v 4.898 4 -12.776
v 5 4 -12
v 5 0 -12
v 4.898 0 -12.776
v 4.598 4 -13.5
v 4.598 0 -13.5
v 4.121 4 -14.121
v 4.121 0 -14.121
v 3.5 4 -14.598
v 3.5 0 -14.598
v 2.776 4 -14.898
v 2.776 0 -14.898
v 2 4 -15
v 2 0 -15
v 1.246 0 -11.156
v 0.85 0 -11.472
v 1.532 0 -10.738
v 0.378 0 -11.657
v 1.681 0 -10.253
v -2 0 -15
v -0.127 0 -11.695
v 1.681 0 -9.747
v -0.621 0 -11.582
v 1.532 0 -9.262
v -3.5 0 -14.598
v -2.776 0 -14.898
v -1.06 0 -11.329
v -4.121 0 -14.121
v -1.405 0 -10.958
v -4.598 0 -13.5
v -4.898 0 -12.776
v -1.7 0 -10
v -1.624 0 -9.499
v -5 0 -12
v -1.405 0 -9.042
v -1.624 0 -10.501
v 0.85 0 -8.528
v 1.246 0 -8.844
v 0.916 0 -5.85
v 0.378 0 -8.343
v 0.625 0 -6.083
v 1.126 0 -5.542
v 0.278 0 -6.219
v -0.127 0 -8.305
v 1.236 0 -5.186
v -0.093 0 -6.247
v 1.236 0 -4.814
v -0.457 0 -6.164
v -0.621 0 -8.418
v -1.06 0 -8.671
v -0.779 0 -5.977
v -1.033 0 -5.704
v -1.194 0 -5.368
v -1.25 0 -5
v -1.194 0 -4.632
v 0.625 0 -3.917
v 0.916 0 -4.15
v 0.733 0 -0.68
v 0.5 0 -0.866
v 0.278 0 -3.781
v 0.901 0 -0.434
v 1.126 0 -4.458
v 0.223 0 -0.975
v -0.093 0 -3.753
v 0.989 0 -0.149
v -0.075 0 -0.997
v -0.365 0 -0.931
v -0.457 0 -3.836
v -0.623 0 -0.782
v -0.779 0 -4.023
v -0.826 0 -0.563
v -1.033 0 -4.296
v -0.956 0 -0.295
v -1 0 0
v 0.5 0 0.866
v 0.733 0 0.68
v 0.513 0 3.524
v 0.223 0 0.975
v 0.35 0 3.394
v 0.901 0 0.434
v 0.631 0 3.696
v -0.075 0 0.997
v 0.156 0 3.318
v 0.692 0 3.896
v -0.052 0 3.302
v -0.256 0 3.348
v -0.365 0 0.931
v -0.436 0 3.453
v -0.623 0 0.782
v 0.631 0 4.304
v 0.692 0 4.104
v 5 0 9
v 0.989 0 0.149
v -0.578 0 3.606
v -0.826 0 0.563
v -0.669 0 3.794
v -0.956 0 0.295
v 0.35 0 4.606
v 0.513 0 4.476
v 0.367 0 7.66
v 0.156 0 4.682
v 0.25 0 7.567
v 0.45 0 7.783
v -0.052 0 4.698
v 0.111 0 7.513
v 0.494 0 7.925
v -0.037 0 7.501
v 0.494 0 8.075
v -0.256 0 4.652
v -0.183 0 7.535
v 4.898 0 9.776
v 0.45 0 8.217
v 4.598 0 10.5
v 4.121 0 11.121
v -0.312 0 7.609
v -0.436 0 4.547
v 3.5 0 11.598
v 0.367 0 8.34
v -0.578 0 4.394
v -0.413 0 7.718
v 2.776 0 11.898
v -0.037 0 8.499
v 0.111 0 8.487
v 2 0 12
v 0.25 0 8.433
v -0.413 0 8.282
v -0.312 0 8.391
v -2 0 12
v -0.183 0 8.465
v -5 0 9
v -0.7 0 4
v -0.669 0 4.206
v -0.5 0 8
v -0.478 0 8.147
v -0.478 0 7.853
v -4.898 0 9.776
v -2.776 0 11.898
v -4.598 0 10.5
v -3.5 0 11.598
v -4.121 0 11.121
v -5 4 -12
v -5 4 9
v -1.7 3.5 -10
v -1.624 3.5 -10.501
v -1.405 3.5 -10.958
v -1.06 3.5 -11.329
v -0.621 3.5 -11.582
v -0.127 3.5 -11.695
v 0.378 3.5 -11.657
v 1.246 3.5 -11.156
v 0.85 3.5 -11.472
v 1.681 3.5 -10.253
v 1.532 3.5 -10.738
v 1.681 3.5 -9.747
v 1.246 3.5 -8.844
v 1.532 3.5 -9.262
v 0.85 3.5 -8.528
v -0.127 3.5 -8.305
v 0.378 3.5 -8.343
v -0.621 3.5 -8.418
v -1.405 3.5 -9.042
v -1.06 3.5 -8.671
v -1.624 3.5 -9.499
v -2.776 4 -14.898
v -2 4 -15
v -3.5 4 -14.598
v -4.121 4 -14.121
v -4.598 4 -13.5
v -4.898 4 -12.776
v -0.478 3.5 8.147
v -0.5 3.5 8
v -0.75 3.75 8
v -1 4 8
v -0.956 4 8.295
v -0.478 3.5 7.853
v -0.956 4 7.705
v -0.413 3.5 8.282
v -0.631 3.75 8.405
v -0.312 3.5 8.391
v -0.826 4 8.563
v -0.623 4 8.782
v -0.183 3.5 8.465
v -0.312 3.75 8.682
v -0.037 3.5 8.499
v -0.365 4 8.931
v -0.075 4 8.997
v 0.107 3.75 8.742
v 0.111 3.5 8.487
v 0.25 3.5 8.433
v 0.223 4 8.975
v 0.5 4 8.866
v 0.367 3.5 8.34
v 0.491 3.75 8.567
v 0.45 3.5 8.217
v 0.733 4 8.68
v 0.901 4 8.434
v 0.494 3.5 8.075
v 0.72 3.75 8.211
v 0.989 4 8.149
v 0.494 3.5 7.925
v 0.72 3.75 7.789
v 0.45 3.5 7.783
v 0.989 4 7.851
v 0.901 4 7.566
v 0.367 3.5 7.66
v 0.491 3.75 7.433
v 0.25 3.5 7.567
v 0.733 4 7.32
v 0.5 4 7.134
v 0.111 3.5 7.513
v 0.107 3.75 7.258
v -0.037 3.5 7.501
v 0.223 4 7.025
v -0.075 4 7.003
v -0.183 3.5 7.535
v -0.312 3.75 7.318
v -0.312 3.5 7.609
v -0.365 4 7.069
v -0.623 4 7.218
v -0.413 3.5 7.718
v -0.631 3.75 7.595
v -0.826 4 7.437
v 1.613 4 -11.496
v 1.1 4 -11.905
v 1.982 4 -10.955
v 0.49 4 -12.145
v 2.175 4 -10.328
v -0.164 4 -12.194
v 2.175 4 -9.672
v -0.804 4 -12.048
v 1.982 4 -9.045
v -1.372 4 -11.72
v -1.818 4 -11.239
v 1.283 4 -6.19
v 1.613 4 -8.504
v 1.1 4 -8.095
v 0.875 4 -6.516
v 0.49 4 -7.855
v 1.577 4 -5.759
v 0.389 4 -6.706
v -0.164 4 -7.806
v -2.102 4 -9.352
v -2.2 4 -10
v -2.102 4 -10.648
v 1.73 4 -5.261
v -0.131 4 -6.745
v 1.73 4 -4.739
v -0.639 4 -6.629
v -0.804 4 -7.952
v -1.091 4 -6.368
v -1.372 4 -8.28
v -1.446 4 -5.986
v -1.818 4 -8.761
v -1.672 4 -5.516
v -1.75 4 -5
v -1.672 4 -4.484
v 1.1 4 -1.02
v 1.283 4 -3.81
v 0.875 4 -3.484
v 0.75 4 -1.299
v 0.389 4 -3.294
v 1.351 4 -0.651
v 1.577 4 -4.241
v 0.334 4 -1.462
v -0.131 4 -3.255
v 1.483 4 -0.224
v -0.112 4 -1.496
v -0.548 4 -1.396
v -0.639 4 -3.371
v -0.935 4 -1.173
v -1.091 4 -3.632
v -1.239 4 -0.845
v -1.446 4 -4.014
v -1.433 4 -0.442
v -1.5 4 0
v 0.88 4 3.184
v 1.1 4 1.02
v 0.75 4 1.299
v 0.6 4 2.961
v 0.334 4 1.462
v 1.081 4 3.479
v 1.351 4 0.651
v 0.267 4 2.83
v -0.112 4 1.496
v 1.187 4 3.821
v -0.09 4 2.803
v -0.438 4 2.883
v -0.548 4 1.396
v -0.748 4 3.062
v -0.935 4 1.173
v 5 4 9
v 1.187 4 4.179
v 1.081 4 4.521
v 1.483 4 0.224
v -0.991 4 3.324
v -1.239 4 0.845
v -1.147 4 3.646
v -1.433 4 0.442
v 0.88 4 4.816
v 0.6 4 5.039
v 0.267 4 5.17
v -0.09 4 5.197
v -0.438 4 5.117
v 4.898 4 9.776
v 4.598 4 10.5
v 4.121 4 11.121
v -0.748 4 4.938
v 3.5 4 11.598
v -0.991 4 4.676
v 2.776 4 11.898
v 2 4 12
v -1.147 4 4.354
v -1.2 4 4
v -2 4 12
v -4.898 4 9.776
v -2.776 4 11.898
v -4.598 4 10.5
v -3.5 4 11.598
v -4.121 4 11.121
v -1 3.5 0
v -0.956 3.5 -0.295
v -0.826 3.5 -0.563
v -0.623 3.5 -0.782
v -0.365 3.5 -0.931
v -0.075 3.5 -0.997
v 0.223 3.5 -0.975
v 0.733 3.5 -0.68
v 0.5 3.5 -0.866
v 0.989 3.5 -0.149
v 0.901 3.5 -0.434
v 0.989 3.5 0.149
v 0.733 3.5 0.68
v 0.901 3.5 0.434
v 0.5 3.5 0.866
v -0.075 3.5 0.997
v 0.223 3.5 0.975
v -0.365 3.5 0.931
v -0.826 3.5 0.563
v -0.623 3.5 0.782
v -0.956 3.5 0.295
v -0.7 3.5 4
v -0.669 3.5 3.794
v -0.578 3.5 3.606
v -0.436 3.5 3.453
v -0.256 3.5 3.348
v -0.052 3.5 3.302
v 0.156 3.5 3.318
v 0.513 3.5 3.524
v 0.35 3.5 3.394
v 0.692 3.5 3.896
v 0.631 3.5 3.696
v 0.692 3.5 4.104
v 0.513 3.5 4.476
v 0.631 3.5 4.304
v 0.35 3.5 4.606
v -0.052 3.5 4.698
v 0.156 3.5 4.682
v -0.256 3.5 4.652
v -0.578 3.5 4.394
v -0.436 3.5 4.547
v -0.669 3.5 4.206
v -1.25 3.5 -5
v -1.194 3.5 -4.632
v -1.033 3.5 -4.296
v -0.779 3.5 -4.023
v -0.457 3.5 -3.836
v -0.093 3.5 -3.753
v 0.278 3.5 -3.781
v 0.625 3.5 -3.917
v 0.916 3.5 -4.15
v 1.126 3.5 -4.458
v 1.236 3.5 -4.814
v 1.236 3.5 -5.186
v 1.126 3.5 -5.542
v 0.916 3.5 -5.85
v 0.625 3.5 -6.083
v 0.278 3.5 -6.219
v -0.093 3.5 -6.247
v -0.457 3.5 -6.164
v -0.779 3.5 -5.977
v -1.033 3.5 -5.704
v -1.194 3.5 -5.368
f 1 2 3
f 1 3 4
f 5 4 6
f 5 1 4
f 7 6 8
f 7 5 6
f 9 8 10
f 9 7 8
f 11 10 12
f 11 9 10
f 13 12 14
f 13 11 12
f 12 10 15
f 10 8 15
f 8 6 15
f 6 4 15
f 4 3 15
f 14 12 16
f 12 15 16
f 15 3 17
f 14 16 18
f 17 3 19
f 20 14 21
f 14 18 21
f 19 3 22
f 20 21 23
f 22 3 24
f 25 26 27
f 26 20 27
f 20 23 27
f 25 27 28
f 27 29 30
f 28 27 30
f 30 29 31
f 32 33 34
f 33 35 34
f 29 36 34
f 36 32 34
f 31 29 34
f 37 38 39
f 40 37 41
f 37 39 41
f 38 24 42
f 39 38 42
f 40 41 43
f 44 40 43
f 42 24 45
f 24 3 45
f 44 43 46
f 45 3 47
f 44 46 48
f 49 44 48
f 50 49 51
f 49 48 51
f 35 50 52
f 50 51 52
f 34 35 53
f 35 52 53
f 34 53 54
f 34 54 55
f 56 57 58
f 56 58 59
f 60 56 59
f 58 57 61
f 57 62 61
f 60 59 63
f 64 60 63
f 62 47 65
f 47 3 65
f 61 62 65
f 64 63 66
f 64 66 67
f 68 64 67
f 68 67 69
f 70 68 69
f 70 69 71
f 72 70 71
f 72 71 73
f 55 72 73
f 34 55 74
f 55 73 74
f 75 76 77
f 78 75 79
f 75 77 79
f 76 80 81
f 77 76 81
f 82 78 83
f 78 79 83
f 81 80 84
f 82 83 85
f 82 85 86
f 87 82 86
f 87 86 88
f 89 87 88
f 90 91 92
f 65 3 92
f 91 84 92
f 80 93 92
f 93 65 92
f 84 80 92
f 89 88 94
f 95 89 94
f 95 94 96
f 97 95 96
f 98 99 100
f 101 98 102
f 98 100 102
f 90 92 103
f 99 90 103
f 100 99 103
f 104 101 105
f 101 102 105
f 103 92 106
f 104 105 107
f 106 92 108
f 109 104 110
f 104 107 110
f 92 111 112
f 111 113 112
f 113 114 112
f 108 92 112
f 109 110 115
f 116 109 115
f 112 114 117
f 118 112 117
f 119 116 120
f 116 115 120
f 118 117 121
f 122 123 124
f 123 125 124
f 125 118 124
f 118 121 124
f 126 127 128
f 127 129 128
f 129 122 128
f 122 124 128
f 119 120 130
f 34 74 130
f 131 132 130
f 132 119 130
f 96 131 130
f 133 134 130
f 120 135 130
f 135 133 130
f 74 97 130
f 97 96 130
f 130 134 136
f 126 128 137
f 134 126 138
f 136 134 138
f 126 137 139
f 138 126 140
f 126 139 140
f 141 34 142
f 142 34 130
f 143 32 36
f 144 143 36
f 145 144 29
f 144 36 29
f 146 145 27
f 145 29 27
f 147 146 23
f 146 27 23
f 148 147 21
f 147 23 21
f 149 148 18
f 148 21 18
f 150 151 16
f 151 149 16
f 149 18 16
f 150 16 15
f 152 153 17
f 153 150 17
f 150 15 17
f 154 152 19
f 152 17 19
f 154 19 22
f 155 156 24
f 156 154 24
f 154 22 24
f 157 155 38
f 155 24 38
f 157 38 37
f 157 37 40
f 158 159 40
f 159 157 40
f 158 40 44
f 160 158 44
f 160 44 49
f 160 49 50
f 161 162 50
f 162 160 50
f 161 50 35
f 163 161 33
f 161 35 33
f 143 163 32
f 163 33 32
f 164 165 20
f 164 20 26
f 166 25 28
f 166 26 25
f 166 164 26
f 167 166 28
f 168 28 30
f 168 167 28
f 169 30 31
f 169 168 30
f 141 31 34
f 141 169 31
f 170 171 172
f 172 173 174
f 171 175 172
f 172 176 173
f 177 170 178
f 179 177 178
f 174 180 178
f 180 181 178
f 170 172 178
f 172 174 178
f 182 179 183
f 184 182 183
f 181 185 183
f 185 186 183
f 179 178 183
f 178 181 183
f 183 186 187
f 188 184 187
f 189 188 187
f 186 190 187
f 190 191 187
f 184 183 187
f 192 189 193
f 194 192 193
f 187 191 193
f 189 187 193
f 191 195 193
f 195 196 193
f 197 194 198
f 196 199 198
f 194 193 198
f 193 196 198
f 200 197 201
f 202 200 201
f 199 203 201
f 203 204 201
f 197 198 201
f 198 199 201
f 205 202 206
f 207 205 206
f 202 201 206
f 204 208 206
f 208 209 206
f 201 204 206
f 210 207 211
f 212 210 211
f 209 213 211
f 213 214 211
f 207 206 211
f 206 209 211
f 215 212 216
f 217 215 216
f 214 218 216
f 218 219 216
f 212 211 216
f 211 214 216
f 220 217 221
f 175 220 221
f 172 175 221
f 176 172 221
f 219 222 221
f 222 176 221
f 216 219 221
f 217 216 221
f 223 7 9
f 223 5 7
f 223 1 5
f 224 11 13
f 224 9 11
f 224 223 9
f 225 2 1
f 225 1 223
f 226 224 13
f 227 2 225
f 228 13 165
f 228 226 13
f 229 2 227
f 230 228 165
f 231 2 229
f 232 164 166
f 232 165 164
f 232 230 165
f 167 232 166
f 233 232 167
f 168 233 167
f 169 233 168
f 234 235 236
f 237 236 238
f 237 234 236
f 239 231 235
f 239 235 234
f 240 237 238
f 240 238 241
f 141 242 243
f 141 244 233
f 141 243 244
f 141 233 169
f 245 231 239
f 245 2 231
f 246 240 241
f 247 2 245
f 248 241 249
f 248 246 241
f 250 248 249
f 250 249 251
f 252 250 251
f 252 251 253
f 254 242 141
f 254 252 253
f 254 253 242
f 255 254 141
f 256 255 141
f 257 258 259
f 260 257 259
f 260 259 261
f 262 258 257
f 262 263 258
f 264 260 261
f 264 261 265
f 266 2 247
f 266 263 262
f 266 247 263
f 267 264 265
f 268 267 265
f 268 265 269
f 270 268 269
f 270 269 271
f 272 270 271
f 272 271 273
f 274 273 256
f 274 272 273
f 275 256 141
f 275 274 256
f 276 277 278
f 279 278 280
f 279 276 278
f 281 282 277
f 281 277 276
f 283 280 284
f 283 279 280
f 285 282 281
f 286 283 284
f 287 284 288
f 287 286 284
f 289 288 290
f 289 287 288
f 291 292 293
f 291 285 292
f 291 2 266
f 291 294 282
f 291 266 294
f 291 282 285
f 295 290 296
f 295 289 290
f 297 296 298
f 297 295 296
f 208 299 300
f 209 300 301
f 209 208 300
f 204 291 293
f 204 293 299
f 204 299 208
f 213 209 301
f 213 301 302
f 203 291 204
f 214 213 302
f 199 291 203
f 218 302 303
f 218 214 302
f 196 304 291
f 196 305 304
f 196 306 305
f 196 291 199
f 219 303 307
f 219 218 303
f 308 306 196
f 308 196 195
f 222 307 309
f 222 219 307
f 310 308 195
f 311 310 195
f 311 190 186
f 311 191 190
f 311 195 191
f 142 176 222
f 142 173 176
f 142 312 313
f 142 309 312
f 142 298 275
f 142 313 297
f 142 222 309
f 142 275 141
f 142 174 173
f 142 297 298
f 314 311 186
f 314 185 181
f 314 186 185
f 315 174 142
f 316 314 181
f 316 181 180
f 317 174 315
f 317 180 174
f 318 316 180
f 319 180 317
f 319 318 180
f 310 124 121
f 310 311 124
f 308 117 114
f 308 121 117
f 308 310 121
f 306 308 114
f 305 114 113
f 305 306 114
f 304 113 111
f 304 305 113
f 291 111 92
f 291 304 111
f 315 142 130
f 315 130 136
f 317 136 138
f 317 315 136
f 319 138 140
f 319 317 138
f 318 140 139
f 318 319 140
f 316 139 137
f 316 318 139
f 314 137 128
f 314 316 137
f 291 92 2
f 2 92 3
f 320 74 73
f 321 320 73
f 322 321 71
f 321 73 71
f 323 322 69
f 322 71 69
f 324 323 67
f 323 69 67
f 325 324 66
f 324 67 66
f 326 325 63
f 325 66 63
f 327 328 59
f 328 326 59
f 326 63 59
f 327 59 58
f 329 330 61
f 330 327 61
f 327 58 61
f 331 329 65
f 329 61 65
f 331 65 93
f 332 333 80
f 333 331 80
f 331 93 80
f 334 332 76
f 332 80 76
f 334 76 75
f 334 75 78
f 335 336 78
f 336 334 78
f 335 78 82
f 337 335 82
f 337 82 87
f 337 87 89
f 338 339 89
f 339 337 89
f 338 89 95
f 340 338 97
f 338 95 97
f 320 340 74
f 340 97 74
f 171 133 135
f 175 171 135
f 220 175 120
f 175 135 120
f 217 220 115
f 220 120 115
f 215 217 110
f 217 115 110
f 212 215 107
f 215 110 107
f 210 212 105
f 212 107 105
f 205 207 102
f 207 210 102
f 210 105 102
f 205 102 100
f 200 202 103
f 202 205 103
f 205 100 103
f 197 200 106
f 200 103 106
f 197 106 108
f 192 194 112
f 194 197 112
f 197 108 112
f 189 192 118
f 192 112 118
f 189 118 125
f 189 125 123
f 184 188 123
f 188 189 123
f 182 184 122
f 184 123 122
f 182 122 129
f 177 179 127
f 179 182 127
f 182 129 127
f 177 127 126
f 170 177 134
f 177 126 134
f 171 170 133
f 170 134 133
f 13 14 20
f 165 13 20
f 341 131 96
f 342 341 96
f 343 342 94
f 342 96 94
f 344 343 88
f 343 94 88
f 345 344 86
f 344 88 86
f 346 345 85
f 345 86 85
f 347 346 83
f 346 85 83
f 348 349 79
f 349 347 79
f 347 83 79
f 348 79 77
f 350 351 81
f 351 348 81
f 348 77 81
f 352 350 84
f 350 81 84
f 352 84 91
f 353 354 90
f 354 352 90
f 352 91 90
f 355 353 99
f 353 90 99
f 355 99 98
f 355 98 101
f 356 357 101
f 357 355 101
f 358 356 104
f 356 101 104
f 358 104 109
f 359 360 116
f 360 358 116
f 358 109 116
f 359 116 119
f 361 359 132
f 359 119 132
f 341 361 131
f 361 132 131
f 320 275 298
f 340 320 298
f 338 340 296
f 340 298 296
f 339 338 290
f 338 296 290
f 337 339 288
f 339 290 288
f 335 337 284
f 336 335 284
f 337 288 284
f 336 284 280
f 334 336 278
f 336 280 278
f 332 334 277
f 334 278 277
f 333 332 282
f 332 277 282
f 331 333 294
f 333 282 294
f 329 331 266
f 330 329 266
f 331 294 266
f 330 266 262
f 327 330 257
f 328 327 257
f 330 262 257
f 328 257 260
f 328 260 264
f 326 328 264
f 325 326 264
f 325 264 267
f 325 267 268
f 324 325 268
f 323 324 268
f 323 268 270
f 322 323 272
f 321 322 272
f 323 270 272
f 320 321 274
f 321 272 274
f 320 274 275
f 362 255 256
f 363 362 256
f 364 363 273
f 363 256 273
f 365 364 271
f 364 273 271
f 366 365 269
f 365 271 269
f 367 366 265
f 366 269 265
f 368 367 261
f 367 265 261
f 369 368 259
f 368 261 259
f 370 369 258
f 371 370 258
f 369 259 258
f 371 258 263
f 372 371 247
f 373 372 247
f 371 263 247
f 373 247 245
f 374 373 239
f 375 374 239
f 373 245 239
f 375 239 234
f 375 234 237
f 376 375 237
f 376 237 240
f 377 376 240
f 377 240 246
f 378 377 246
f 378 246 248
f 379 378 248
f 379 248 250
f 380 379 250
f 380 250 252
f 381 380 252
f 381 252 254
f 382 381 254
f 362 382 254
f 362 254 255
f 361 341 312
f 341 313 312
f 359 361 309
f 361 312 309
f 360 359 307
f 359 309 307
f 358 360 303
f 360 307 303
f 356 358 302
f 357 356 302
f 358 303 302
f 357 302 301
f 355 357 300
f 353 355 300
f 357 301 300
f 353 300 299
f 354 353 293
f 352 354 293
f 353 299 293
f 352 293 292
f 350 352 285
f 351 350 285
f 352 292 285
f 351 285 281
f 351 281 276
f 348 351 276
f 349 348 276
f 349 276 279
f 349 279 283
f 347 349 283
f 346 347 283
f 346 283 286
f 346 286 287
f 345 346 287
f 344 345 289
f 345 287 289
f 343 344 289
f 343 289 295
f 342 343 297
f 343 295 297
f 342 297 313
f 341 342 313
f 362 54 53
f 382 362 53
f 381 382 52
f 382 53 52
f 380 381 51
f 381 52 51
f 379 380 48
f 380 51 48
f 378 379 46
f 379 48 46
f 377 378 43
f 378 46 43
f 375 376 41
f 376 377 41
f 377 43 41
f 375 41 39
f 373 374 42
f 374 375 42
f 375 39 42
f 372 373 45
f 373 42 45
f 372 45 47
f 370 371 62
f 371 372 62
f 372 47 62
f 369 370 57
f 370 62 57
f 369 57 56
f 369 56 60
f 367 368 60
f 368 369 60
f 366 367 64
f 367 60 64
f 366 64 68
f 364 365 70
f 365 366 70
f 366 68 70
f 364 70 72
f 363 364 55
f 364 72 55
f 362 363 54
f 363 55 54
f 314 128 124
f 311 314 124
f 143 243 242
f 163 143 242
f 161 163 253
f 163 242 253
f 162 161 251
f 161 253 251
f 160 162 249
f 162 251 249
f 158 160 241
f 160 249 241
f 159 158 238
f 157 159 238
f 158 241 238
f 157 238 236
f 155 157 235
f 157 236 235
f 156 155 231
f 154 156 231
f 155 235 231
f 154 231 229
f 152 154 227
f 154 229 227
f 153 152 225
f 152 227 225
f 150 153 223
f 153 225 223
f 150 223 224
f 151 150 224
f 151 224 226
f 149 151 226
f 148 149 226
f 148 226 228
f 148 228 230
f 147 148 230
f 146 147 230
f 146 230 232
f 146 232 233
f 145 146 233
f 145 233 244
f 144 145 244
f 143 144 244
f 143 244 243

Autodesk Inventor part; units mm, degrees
ref_plane "YZ Plane" through (0, 0, 0) normal (1, 0, 0) x (0, 1, 0)
ref_plane "XZ Plane" through (0, 0, 0) normal (0, 1, 0) x (-1, 0, 0)
ref_plane "XY Plane" through (0, 0, 0) normal (0, 0, 1) x (1, 0, 0)
sketch "Sketch1" plane through (0, 0, 0) normal (0, 1, 0) x (-1, 0, 0)
  circle A0 centre (0, 0) radius 1
  circle A1 centre (0, 4) radius 0.7
  circle A2 centre (0, -10) radius 1.7
  circle A3 centre (0, 8) radius 0.5
  circle A4 centre (0, -5) radius 1.25
  line L0 (5, 12) -> (-5, 12)
  line L1 (-5, 12) -> (-5, -15)
  line L2 (-5, -15) -> (5, -15)
  line L3 (5, -15) -> (5, 12)
  dimension "d0" = 2
  dimension "d1" = 1.4
  dimension "d2" = 3.4
  dimension "d3" = 1
  dimension "d4" = 2.5
  dimension "d5" = 4
  dimension "d6" = 4
  dimension "d7" = 5
  dimension "d8" = 5
  dimension "d11" = 4
  dimension "d12" = 5
  dimension "d13" = 5
  dimension "d14" = 5
extrude "Extrusion1" add sketch "Sketch1" along normal blind 4
fillet "Fillet1" radius 3 4 edges at (5, 2, 12) (-5, 2, 12) (-5, 2, -15) (5, 2, -15)
chamfer "Chamfer1" distance 0.5 angle 45 5 edges at (1.7, 4, -10) (1.25, 4, -5) (1, 4, 0) (0.7, 4, 4) (0.5, 4, 8)
properties part number "hole_size_test"
